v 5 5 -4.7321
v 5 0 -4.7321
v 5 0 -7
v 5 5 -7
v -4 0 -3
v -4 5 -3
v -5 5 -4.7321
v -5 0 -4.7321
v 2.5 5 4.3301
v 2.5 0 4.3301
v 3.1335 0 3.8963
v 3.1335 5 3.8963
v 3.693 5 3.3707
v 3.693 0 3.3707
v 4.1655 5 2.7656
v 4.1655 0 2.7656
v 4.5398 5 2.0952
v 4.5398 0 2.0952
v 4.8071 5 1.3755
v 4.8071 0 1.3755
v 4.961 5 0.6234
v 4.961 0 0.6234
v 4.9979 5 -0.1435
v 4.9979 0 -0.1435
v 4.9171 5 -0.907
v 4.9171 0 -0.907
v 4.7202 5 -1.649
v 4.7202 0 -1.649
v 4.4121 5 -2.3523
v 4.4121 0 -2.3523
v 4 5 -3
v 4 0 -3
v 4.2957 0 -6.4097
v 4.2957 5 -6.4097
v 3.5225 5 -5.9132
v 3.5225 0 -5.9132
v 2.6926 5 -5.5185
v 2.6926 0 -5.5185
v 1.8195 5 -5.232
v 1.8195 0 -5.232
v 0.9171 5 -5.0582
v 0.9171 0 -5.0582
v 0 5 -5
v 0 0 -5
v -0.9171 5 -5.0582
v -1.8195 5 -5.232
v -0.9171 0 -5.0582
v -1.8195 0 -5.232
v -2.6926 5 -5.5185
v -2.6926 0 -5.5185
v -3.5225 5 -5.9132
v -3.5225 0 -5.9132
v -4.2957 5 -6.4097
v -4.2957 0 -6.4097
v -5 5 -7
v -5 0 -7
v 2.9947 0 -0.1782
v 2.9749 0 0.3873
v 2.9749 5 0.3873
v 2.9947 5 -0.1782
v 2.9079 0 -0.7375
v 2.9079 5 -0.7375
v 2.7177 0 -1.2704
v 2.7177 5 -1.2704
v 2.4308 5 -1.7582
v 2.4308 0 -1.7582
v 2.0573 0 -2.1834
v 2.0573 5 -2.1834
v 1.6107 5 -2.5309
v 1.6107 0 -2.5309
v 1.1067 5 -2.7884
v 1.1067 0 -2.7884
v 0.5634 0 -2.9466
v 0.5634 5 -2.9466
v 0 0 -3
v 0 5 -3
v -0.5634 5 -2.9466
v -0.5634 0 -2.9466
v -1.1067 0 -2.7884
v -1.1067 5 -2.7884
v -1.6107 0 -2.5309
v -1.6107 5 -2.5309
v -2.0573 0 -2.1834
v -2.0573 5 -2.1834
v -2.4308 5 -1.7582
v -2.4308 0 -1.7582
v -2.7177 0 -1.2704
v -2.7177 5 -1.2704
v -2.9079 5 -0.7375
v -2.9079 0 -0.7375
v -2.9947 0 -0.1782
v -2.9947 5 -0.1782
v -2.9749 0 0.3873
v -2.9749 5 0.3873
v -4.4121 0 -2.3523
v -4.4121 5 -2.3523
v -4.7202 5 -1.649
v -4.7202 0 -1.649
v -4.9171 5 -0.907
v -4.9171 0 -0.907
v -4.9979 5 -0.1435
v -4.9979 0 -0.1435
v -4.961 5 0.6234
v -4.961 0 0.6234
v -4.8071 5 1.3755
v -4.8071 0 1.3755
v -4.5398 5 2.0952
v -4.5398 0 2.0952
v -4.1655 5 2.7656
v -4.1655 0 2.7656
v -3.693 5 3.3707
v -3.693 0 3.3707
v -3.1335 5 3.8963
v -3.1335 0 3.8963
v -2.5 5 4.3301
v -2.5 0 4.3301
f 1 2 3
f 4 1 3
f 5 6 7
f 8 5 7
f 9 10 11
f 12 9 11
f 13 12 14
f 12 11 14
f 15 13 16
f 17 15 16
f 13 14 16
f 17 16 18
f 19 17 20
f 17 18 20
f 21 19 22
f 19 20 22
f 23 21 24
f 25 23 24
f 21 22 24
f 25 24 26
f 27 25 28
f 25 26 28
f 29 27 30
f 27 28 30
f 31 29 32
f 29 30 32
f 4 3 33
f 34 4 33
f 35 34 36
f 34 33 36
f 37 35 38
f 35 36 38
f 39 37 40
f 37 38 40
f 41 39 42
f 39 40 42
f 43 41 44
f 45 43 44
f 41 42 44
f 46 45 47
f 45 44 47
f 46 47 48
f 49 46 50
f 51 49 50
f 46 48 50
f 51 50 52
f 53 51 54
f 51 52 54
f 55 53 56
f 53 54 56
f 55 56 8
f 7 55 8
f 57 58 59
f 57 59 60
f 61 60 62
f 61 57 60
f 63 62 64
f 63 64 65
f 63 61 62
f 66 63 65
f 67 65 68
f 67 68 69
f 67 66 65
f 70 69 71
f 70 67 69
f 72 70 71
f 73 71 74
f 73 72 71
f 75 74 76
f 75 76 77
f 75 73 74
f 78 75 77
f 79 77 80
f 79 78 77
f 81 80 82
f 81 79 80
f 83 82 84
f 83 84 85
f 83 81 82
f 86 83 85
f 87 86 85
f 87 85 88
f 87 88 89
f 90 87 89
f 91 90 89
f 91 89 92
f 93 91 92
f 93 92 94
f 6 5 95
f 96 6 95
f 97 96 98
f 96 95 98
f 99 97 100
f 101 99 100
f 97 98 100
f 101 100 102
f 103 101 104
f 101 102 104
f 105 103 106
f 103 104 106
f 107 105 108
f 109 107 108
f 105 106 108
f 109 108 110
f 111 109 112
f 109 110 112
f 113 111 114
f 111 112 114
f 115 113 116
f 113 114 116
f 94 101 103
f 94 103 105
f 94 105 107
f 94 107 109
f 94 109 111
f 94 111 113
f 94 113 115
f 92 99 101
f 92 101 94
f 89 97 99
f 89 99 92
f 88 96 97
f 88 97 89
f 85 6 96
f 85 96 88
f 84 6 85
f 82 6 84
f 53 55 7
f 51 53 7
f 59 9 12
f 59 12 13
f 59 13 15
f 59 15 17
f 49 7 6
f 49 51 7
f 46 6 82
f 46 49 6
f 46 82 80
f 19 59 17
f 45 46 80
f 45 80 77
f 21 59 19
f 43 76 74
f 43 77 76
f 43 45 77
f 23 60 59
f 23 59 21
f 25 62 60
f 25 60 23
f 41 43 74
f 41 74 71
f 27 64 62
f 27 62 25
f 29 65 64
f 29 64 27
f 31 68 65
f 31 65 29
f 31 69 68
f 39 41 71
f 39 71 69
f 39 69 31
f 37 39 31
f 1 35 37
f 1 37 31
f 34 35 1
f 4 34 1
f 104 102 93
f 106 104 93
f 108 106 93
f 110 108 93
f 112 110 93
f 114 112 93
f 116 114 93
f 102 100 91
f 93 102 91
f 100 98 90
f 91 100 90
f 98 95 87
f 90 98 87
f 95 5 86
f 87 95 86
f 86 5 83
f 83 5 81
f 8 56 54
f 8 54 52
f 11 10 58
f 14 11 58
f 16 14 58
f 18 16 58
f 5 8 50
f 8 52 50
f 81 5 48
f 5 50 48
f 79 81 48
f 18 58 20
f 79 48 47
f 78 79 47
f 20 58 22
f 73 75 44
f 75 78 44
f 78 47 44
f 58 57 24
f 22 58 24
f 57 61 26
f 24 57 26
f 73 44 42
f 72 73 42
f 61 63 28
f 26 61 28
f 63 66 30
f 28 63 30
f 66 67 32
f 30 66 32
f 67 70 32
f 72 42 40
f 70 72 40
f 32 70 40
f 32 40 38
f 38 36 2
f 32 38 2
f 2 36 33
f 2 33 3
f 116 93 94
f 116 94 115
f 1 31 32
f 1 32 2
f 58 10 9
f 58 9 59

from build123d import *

# Parameters (mm, degrees)
CROQUIS1_R              = 3
SALIENTE_EXTRUIR1_DEPTH = 5
CORTAR_EXTRUIR1_START   = -10
CORTAR_EXTRUIR1_DEPTH   = 10
CORTAR_EXTRUIR2_DEPTH   = 10


with BuildPart() as part:
    # Croquis1 → Saliente-Extruir1 (new body)
    with BuildSketch(Plane(origin=(0, 0, 0), x_dir=(1, 0, 0), z_dir=(0, 1, 0))):
        with BuildLine():
            Line((-5, 7), (-5, 3))
            Line((-5, 3), (-4, 3))
            ThreePointArc((-4, 3), (0, -5), (4, 3))
            Line((4, 3), (5, 3))
            Line((5, 3), (5, 7))
            ThreePointArc((5, 7), (0, 5), (-5, 7))
        make_face()
        Circle(CROQUIS1_R, mode=Mode.SUBTRACT)
    extrude(amount=SALIENTE_EXTRUIR1_DEPTH)

    # Croquis2 → Cortar-Extruir1 (cut)
    with BuildSketch(Plane(origin=(0, 5, 0), x_dir=(1, 0, 0), z_dir=(0, 1, 0)).offset(CORTAR_EXTRUIR1_START)):
        with BuildLine():
            ThreePointArc((-2.5, -4.330127019), (-1.294095226, -4.829629131), (0, -5))
            ThreePointArc((0, -5), (1.294095226, -4.829629131), (2.5, -4.330127019))
            Line((2.5, -4.330127019), (2.981780701, -0.330127019))
            ThreePointArc((2.981780701, -0.330127019), (2.995441712, -0.165314693), (3, 0))
            ThreePointArc((3, 0), (-0.165314693, 2.995441712), (-2.981780701, -0.330127019))
            Line((-2.981780701, -0.330127019), (-2.5, -4.330127019))
        make_face()
    extrude(amount=CORTAR_EXTRUIR1_DEPTH, mode=Mode.SUBTRACT)

    # Croquis3 → Cortar-Extruir2 (cut)
    with BuildSketch(Plane(origin=(0, 5, 0), x_dir=(1, 0, 0), z_dir=(0, 1, 0))):
        Polygon((4, 3), (5, 4.732050808), (5, 3), align=None)
        Polygon((-4, 3), (-5, 4.732050808), (-5, 3), align=None)
    extrude(amount=-CORTAR_EXTRUIR2_DEPTH, mode=Mode.SUBTRACT)


solid = part.part
